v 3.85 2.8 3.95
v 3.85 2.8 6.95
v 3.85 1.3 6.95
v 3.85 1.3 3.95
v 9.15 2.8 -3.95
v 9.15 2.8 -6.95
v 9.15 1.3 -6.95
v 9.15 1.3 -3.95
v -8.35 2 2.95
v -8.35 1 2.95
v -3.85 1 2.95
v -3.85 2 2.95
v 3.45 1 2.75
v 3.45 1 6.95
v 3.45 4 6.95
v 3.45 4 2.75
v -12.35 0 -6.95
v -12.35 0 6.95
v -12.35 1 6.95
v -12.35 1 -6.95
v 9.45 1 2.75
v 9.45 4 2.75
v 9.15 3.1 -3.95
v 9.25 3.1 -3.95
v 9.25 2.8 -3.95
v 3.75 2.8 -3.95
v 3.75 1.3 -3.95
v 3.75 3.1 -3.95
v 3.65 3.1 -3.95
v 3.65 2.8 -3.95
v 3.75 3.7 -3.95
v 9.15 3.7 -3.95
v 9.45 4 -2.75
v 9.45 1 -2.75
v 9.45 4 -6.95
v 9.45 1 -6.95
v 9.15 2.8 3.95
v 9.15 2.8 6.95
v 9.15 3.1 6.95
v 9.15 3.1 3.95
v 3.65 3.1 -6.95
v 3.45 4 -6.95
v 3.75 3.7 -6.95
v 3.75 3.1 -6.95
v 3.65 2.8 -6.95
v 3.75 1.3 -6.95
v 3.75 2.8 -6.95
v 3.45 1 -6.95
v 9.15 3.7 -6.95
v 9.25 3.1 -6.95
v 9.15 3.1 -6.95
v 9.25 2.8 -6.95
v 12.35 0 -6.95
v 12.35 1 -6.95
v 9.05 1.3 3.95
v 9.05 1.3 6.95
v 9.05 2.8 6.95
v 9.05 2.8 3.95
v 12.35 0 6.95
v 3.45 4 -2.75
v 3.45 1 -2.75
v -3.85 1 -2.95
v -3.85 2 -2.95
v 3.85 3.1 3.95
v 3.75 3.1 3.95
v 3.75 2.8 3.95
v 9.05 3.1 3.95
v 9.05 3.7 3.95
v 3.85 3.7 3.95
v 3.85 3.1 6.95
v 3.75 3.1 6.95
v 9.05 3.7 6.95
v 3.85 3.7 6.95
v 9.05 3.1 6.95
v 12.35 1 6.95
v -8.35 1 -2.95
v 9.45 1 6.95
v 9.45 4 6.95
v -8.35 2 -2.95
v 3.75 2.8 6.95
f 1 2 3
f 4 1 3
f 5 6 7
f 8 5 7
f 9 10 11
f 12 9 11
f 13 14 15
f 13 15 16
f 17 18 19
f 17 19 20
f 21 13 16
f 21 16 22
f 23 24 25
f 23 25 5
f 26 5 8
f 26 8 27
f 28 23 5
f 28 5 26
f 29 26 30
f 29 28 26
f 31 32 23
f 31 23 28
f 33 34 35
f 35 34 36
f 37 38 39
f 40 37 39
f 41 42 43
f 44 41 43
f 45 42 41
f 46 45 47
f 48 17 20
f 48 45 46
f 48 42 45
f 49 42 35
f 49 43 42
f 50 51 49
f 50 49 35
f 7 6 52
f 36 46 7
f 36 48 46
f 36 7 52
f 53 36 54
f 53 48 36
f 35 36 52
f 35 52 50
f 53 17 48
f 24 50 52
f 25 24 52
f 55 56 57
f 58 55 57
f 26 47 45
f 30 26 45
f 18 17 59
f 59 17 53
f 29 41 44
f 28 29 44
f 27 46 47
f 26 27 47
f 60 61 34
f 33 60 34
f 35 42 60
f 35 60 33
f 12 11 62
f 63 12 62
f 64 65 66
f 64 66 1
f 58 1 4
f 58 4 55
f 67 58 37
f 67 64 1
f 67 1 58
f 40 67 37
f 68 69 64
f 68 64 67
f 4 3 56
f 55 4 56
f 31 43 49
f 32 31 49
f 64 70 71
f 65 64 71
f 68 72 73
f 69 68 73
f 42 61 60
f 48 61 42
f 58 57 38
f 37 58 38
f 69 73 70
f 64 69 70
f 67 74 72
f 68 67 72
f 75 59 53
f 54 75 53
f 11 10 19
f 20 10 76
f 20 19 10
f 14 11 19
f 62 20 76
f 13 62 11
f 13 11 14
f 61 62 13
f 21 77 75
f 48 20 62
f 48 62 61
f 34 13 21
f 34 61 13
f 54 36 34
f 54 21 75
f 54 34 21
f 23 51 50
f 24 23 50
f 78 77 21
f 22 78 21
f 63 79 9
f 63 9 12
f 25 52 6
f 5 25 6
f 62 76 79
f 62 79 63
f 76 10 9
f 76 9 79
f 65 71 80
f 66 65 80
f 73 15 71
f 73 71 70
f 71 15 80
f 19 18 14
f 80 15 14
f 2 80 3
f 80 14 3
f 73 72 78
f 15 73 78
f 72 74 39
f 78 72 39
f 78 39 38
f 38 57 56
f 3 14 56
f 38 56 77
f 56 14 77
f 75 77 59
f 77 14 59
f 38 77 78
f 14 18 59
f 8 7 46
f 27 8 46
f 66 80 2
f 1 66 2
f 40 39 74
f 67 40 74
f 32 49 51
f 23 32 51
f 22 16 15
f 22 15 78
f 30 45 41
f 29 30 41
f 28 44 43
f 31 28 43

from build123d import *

# Parameters (mm, degrees)
SKETCH1_W           = 24.7
SKETCH1_H           = 13.9
BOSS_EXTRUDE1_DEPTH = 1
SKETCH2_W           = 6
SKETCH2_H           = 4.2
BOSS_EXTRUDE2_DEPTH = 3
CUT_EXTRUDE1_DEPTH  = 3
CUT_EXTRUDE2_DEPTH  = 3
SKETCH6_W           = 4.5
SKETCH6_H           = 5.9
BOSS_EXTRUDE3_DEPTH = 1


with BuildPart() as part:
    # Sketch1 → Boss-Extrude1 (new body)
    with BuildSketch(Plane(origin=(0, 0, 0), x_dir=(1, 0, 0), z_dir=(0, 1, 0))):
        Rectangle(SKETCH1_W, SKETCH1_H)
    extrude(amount=BOSS_EXTRUDE1_DEPTH)

    # Sketch2 → Boss-Extrude2 (add)
    with BuildSketch(Plane(origin=(0, 1, 0), x_dir=(1, 0, 0), z_dir=(0, 1, 0))):
        with Locations((6.45, -4.85)):
            Rectangle(SKETCH2_W, SKETCH2_H)
        with Locations((6.45, 4.85)):
            Rectangle(SKETCH2_W, SKETCH2_H)
    extrude(amount=BOSS_EXTRUDE2_DEPTH)

    # Sketch3 → Cut-Extrude1 (cut)
    with BuildSketch(Plane.XY.offset(6.95)):
        Polygon((3.85, 3.7), (3.85, 3.1), (3.75, 3.1), (3.75, 2.8), (3.85, 2.8), (3.85, 1.3), (9.05, 1.3), (9.05, 2.8), (9.15, 2.8), (9.15, 3.1), (9.05, 3.1), (9.05, 3.7), align=None)
    extrude(amount=-CUT_EXTRUDE1_DEPTH, mode=Mode.SUBTRACT)

    # Sketch5 → Cut-Extrude2 (cut)
    with BuildSketch(Plane(origin=(0, 0, -6.95), x_dir=(-1, 0, 0), z_dir=(0, 0, -1))):
        Polygon((-9.15, 3.7), (-9.15, 3.1), (-9.25, 3.1), (-9.25, 2.8), (-9.15, 2.8), (-9.15, 1.3), (-3.75, 1.3), (-3.75, 2.8), (-3.65, 2.8), (-3.65, 3.1), (-3.75, 3.1), (-3.75, 3.7), align=None)
    extrude(amount=-CUT_EXTRUDE2_DEPTH, mode=Mode.SUBTRACT)

    # Sketch6 → Boss-Extrude3 (add)
    with BuildSketch(Plane(origin=(0, 1, 0), x_dir=(1, 0, 0), z_dir=(0, 1, 0))):
        with Locations((-6.1, 0)):
            Rectangle(SKETCH6_W, SKETCH6_H)
    extrude(amount=BOSS_EXTRUDE3_DEPTH)


solid = part.part
